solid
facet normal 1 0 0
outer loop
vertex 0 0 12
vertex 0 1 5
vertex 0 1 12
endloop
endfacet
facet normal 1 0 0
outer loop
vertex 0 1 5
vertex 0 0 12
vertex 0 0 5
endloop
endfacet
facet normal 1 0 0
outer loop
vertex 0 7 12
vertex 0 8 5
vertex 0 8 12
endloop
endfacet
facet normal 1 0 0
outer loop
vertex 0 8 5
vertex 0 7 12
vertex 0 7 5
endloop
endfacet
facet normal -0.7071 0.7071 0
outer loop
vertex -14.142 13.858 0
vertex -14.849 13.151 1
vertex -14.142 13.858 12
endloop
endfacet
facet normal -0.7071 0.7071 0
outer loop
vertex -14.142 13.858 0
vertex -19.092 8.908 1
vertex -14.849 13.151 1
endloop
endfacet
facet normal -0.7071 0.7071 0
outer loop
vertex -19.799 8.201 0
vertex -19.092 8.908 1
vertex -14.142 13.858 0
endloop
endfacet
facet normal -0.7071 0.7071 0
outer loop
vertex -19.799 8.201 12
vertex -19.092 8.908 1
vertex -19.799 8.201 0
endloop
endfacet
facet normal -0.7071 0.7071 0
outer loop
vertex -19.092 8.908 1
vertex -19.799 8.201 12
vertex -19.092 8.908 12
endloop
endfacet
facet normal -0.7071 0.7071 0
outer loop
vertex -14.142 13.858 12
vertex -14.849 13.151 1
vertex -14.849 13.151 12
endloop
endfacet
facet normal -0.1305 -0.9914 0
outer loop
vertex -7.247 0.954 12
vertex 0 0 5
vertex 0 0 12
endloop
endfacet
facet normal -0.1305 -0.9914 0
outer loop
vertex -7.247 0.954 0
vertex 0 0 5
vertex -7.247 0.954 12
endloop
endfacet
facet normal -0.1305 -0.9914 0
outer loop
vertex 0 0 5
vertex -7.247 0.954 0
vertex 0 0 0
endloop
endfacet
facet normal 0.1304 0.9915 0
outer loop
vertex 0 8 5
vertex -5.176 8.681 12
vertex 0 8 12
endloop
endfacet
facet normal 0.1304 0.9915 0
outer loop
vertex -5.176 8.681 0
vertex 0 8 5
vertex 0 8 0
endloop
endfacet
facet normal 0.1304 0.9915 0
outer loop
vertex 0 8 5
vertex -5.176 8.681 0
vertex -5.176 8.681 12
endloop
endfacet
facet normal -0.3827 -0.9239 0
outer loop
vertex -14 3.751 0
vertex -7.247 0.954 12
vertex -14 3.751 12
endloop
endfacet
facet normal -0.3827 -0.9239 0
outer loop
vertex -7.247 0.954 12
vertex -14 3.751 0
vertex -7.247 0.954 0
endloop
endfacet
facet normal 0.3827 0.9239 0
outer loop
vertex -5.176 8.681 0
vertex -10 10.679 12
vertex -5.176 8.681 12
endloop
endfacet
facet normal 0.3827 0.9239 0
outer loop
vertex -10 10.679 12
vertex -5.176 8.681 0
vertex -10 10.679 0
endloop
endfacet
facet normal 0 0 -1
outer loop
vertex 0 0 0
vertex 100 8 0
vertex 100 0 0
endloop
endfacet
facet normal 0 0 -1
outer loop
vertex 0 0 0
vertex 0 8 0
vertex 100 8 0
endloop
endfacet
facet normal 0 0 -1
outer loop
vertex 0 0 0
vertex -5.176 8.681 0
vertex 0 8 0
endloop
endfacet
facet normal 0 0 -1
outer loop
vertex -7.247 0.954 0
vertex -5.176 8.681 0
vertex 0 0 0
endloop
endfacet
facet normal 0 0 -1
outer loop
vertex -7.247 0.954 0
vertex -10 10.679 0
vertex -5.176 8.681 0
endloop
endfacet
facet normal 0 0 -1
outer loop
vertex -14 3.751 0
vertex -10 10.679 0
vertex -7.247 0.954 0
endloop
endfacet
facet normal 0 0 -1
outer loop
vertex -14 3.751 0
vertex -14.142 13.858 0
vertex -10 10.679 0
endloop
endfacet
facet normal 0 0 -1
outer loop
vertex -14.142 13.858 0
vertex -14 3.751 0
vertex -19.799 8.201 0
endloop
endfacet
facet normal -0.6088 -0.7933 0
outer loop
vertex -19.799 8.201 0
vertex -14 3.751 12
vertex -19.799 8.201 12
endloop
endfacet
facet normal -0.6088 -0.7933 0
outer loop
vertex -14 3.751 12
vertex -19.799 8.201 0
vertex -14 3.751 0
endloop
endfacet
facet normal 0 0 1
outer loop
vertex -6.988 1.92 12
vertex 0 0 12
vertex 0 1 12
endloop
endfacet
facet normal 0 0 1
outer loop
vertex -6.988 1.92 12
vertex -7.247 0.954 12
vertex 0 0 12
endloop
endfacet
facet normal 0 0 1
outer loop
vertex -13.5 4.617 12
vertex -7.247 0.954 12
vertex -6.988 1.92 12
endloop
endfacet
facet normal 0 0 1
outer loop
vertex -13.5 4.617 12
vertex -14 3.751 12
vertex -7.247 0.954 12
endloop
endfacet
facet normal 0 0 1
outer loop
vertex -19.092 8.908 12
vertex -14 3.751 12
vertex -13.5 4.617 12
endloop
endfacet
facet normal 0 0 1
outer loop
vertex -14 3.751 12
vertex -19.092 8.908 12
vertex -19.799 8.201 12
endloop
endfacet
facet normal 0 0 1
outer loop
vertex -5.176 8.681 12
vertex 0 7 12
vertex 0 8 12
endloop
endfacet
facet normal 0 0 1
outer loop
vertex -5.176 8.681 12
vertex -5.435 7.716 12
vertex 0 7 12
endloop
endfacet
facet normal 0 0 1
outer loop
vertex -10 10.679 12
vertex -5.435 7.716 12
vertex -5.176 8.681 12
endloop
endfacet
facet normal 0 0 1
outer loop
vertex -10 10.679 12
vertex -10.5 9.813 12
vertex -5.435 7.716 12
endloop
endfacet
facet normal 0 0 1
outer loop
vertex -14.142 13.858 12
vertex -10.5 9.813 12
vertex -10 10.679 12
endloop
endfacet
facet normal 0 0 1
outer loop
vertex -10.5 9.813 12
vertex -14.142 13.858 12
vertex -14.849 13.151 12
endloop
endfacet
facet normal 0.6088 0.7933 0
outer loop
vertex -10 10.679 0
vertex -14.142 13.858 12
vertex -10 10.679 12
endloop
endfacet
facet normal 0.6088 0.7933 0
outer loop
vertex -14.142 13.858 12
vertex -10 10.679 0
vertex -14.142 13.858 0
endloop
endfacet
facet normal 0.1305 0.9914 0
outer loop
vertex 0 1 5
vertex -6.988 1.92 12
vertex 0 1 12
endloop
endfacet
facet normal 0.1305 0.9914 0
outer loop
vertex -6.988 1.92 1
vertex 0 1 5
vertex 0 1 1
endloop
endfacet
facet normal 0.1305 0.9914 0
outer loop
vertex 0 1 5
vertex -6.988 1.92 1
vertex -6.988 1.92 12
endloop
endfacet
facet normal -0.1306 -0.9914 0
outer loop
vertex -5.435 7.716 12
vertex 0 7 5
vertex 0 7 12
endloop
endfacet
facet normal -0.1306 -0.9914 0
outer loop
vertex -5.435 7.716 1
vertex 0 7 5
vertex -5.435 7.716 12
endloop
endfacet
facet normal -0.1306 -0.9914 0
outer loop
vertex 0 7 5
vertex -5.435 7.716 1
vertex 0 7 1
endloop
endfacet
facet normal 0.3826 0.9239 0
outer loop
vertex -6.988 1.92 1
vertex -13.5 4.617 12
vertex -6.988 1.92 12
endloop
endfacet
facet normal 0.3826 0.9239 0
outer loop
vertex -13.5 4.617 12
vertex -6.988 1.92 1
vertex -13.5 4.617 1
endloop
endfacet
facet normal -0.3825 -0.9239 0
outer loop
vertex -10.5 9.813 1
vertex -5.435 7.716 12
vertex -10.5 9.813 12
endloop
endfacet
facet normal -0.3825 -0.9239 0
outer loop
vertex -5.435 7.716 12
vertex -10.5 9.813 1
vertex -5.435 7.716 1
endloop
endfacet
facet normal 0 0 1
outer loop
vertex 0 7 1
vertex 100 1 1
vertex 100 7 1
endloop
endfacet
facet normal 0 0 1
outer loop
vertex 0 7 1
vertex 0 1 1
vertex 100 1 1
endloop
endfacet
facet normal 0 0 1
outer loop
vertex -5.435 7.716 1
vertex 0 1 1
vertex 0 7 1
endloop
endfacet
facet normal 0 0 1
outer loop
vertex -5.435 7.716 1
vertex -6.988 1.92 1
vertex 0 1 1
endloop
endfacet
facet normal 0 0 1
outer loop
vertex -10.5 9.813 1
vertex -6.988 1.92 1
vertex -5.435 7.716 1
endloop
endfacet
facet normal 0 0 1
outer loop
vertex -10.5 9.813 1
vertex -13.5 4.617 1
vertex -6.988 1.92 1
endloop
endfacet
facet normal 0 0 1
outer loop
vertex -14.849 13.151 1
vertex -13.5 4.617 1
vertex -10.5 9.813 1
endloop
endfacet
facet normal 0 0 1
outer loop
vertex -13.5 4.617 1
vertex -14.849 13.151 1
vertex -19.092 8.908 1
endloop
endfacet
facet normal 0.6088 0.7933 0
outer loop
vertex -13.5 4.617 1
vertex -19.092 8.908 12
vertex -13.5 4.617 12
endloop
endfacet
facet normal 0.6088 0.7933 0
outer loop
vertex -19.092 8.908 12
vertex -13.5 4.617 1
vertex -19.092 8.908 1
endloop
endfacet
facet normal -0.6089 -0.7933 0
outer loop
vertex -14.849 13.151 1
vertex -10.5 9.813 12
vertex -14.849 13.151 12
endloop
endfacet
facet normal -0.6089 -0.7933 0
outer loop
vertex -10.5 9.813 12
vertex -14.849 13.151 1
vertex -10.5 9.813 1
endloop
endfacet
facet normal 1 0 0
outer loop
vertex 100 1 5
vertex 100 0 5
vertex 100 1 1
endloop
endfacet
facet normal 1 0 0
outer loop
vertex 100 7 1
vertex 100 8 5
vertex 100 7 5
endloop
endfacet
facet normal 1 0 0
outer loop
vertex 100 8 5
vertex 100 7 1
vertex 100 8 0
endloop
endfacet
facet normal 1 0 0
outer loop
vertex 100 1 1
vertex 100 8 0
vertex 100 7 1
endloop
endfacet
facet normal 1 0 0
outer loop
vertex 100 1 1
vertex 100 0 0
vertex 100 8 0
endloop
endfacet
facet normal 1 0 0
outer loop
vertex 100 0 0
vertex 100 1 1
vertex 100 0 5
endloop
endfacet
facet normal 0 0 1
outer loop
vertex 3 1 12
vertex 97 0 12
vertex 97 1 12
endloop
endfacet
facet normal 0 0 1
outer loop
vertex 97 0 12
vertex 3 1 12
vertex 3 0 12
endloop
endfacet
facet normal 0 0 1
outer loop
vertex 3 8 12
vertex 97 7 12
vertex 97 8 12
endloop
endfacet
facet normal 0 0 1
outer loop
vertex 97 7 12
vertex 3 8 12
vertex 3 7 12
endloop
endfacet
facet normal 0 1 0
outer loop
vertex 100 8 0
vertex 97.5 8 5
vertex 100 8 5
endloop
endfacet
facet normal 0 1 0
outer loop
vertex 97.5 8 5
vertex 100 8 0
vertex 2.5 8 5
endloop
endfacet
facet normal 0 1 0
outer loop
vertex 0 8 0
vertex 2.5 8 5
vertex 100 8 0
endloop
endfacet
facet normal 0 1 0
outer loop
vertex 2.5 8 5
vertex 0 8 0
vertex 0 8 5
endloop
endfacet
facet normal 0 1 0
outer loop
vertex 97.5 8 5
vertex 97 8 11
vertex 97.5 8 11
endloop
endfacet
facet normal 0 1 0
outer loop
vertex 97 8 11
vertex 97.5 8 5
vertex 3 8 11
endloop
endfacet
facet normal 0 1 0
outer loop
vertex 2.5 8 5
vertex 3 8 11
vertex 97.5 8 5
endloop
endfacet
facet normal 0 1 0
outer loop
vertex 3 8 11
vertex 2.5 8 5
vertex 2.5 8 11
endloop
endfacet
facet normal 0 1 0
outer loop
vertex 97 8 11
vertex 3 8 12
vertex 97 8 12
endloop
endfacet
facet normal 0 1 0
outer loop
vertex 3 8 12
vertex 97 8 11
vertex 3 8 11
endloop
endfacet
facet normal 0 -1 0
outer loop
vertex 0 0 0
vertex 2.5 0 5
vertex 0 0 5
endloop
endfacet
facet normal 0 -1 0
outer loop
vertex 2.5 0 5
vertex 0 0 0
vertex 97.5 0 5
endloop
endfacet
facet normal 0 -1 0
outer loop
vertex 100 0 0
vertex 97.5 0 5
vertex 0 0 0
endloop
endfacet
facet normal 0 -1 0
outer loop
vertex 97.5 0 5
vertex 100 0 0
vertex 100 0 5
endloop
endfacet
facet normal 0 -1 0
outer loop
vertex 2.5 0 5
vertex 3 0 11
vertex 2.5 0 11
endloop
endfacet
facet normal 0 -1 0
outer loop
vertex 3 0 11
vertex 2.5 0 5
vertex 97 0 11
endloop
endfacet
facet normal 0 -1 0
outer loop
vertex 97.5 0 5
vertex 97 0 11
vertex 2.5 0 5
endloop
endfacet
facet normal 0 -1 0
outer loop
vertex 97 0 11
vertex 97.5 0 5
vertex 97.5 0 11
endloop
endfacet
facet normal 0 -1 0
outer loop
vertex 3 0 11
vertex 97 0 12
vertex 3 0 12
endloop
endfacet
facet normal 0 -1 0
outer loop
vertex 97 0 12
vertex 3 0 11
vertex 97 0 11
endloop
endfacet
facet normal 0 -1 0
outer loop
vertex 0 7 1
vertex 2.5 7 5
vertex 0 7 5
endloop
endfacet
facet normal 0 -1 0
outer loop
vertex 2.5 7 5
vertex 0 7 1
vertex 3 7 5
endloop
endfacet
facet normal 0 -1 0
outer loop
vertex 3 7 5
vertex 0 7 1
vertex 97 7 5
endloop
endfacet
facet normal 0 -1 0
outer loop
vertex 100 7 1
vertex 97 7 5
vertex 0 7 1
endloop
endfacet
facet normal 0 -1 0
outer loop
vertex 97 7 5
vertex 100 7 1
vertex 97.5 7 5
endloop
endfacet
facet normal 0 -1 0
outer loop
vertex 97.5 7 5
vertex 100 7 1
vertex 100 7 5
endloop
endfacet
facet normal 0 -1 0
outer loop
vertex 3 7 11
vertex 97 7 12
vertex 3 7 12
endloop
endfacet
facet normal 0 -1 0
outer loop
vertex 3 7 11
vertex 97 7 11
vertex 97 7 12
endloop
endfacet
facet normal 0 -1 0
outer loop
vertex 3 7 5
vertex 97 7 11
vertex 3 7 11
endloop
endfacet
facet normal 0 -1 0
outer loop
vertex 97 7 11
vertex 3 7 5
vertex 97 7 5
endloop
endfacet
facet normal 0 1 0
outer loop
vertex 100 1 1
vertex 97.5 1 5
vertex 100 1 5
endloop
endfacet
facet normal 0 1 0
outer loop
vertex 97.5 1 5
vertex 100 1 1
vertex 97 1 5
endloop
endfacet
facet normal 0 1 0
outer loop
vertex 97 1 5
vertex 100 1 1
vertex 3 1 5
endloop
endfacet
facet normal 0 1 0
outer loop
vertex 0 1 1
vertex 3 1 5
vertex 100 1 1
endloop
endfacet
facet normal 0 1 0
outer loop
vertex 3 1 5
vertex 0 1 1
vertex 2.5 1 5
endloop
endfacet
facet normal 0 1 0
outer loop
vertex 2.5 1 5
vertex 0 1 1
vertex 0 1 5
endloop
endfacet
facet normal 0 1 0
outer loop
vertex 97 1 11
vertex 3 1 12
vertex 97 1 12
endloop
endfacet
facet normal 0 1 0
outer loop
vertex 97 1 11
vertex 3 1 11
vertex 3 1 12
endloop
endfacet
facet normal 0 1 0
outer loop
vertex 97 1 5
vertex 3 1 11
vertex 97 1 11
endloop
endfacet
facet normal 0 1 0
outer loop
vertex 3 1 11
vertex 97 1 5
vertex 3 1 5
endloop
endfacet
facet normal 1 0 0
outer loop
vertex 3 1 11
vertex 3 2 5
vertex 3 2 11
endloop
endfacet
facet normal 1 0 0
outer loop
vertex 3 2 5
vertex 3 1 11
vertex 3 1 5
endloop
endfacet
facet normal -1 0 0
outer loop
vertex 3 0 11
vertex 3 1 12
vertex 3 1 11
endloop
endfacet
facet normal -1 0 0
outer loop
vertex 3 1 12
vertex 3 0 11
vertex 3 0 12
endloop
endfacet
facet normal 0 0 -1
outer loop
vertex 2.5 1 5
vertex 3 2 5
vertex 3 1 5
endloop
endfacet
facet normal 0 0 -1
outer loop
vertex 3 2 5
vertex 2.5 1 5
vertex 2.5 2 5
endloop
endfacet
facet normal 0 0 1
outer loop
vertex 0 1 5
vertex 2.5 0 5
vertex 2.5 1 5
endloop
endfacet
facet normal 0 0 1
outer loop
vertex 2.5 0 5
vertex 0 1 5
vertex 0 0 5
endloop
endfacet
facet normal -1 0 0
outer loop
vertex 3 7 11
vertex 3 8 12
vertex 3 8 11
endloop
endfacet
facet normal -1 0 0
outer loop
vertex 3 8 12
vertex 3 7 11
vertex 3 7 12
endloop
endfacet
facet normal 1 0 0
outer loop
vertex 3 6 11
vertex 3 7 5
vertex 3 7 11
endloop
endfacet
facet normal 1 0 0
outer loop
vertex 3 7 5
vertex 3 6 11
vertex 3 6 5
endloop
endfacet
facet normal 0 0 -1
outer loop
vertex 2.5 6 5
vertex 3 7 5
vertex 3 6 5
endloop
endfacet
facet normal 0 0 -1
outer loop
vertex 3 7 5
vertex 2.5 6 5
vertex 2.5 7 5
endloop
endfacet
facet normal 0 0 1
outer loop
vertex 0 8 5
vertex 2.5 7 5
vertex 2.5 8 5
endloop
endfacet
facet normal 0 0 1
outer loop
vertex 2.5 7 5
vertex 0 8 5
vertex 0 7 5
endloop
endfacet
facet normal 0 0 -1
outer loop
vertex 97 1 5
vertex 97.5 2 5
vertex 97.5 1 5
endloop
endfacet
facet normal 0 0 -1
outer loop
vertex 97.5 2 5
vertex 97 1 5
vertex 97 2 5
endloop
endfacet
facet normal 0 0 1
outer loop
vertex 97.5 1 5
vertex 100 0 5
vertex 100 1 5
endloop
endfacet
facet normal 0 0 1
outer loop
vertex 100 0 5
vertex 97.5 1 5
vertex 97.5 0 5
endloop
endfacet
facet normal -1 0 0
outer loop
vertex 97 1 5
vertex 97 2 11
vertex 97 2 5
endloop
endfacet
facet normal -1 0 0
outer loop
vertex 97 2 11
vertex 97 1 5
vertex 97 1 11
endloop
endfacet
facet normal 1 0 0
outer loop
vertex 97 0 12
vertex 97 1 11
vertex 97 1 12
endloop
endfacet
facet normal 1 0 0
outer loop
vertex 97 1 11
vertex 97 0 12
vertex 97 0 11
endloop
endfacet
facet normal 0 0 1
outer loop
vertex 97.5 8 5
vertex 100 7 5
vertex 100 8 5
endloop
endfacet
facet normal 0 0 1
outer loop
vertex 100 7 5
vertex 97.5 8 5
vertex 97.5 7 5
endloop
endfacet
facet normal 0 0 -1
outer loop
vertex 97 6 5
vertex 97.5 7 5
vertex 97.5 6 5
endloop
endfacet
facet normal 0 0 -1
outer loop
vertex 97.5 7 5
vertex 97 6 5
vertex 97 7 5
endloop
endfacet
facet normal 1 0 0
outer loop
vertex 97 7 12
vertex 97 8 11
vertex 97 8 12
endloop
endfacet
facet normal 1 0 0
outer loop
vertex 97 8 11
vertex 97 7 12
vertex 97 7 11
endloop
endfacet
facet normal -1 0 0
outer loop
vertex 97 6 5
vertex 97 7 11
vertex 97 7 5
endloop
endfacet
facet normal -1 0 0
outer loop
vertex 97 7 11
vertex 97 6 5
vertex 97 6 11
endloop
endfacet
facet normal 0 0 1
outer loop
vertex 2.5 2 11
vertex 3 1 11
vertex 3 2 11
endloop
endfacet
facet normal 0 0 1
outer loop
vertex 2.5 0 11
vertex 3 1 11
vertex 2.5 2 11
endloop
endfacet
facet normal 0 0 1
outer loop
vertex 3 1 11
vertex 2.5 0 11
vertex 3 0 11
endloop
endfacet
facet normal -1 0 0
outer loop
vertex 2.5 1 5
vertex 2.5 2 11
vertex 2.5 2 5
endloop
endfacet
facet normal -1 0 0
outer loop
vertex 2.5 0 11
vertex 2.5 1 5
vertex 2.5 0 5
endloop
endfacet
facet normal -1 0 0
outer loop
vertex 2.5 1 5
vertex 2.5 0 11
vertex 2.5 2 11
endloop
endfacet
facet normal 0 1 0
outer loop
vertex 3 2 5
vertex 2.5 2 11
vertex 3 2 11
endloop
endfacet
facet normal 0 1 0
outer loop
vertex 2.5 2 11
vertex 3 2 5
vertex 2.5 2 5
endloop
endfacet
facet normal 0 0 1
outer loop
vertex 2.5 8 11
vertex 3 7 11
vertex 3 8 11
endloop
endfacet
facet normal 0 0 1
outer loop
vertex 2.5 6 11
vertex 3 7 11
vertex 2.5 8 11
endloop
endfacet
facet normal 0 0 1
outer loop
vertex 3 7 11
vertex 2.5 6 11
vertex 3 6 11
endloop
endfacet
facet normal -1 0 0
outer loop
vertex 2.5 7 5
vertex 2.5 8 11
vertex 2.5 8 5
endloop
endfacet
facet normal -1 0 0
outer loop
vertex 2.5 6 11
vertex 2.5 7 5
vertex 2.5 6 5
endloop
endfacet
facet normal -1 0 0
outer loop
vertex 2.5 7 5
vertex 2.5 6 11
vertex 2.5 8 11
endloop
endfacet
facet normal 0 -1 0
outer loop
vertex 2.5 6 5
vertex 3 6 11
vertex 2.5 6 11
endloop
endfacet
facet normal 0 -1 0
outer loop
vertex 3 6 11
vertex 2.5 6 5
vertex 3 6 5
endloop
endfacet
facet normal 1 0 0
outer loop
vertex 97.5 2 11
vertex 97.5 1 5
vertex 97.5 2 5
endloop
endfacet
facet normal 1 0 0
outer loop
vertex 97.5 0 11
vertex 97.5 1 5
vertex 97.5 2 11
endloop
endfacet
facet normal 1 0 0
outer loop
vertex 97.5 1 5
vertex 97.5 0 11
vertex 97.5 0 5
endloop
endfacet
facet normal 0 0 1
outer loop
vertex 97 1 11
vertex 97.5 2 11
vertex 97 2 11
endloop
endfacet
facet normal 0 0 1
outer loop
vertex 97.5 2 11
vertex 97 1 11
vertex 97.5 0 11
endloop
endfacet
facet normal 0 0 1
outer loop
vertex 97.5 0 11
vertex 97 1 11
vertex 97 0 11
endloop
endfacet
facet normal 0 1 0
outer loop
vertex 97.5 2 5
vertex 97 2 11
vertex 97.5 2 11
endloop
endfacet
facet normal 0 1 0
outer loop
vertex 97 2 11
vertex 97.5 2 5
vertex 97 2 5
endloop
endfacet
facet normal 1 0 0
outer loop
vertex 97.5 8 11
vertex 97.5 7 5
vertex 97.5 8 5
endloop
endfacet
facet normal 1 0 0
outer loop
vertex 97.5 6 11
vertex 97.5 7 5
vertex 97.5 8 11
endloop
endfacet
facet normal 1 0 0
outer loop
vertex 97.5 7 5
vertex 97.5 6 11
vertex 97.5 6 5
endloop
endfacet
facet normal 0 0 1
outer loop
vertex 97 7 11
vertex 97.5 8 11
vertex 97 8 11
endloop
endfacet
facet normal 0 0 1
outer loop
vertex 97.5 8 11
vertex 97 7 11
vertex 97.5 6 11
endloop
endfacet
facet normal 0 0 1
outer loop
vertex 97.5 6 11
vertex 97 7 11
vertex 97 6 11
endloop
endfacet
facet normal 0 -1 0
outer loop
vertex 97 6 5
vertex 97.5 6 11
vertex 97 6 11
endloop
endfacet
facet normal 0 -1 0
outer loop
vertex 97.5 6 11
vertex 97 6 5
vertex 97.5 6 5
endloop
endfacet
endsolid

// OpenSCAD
rotate([0,180,90]) translate([-28,0,-12]) { difference() {
  rotate_extrude (angle=45) translate([20,0,0]) square (size=[8,12], $fn=100);
  
 #rotate_extrude (angle=45) translate([21,0,0]) square (size=[6,11], $fn=100);
    }
  }
difference() {
cube([100,8,12]);
translate([0,1,1]) cube([100,6,11]);
translate([0,0,5]) cube([3,1,7]);
translate([0,7,5]) cube([3,1,7]);
translate([97,0,5]) cube([3,1,7]);
translate([97,7,5]) cube([3,1,7]);
}
translate([2.5,0,5]) cube([0.5,2,6]);
translate([2.5,6,5]) cube([0.5,2,6]);
translate([97,0,5]) cube([0.5,2,6]);
translate([97,6,5]) cube([0.5,2,6]);
